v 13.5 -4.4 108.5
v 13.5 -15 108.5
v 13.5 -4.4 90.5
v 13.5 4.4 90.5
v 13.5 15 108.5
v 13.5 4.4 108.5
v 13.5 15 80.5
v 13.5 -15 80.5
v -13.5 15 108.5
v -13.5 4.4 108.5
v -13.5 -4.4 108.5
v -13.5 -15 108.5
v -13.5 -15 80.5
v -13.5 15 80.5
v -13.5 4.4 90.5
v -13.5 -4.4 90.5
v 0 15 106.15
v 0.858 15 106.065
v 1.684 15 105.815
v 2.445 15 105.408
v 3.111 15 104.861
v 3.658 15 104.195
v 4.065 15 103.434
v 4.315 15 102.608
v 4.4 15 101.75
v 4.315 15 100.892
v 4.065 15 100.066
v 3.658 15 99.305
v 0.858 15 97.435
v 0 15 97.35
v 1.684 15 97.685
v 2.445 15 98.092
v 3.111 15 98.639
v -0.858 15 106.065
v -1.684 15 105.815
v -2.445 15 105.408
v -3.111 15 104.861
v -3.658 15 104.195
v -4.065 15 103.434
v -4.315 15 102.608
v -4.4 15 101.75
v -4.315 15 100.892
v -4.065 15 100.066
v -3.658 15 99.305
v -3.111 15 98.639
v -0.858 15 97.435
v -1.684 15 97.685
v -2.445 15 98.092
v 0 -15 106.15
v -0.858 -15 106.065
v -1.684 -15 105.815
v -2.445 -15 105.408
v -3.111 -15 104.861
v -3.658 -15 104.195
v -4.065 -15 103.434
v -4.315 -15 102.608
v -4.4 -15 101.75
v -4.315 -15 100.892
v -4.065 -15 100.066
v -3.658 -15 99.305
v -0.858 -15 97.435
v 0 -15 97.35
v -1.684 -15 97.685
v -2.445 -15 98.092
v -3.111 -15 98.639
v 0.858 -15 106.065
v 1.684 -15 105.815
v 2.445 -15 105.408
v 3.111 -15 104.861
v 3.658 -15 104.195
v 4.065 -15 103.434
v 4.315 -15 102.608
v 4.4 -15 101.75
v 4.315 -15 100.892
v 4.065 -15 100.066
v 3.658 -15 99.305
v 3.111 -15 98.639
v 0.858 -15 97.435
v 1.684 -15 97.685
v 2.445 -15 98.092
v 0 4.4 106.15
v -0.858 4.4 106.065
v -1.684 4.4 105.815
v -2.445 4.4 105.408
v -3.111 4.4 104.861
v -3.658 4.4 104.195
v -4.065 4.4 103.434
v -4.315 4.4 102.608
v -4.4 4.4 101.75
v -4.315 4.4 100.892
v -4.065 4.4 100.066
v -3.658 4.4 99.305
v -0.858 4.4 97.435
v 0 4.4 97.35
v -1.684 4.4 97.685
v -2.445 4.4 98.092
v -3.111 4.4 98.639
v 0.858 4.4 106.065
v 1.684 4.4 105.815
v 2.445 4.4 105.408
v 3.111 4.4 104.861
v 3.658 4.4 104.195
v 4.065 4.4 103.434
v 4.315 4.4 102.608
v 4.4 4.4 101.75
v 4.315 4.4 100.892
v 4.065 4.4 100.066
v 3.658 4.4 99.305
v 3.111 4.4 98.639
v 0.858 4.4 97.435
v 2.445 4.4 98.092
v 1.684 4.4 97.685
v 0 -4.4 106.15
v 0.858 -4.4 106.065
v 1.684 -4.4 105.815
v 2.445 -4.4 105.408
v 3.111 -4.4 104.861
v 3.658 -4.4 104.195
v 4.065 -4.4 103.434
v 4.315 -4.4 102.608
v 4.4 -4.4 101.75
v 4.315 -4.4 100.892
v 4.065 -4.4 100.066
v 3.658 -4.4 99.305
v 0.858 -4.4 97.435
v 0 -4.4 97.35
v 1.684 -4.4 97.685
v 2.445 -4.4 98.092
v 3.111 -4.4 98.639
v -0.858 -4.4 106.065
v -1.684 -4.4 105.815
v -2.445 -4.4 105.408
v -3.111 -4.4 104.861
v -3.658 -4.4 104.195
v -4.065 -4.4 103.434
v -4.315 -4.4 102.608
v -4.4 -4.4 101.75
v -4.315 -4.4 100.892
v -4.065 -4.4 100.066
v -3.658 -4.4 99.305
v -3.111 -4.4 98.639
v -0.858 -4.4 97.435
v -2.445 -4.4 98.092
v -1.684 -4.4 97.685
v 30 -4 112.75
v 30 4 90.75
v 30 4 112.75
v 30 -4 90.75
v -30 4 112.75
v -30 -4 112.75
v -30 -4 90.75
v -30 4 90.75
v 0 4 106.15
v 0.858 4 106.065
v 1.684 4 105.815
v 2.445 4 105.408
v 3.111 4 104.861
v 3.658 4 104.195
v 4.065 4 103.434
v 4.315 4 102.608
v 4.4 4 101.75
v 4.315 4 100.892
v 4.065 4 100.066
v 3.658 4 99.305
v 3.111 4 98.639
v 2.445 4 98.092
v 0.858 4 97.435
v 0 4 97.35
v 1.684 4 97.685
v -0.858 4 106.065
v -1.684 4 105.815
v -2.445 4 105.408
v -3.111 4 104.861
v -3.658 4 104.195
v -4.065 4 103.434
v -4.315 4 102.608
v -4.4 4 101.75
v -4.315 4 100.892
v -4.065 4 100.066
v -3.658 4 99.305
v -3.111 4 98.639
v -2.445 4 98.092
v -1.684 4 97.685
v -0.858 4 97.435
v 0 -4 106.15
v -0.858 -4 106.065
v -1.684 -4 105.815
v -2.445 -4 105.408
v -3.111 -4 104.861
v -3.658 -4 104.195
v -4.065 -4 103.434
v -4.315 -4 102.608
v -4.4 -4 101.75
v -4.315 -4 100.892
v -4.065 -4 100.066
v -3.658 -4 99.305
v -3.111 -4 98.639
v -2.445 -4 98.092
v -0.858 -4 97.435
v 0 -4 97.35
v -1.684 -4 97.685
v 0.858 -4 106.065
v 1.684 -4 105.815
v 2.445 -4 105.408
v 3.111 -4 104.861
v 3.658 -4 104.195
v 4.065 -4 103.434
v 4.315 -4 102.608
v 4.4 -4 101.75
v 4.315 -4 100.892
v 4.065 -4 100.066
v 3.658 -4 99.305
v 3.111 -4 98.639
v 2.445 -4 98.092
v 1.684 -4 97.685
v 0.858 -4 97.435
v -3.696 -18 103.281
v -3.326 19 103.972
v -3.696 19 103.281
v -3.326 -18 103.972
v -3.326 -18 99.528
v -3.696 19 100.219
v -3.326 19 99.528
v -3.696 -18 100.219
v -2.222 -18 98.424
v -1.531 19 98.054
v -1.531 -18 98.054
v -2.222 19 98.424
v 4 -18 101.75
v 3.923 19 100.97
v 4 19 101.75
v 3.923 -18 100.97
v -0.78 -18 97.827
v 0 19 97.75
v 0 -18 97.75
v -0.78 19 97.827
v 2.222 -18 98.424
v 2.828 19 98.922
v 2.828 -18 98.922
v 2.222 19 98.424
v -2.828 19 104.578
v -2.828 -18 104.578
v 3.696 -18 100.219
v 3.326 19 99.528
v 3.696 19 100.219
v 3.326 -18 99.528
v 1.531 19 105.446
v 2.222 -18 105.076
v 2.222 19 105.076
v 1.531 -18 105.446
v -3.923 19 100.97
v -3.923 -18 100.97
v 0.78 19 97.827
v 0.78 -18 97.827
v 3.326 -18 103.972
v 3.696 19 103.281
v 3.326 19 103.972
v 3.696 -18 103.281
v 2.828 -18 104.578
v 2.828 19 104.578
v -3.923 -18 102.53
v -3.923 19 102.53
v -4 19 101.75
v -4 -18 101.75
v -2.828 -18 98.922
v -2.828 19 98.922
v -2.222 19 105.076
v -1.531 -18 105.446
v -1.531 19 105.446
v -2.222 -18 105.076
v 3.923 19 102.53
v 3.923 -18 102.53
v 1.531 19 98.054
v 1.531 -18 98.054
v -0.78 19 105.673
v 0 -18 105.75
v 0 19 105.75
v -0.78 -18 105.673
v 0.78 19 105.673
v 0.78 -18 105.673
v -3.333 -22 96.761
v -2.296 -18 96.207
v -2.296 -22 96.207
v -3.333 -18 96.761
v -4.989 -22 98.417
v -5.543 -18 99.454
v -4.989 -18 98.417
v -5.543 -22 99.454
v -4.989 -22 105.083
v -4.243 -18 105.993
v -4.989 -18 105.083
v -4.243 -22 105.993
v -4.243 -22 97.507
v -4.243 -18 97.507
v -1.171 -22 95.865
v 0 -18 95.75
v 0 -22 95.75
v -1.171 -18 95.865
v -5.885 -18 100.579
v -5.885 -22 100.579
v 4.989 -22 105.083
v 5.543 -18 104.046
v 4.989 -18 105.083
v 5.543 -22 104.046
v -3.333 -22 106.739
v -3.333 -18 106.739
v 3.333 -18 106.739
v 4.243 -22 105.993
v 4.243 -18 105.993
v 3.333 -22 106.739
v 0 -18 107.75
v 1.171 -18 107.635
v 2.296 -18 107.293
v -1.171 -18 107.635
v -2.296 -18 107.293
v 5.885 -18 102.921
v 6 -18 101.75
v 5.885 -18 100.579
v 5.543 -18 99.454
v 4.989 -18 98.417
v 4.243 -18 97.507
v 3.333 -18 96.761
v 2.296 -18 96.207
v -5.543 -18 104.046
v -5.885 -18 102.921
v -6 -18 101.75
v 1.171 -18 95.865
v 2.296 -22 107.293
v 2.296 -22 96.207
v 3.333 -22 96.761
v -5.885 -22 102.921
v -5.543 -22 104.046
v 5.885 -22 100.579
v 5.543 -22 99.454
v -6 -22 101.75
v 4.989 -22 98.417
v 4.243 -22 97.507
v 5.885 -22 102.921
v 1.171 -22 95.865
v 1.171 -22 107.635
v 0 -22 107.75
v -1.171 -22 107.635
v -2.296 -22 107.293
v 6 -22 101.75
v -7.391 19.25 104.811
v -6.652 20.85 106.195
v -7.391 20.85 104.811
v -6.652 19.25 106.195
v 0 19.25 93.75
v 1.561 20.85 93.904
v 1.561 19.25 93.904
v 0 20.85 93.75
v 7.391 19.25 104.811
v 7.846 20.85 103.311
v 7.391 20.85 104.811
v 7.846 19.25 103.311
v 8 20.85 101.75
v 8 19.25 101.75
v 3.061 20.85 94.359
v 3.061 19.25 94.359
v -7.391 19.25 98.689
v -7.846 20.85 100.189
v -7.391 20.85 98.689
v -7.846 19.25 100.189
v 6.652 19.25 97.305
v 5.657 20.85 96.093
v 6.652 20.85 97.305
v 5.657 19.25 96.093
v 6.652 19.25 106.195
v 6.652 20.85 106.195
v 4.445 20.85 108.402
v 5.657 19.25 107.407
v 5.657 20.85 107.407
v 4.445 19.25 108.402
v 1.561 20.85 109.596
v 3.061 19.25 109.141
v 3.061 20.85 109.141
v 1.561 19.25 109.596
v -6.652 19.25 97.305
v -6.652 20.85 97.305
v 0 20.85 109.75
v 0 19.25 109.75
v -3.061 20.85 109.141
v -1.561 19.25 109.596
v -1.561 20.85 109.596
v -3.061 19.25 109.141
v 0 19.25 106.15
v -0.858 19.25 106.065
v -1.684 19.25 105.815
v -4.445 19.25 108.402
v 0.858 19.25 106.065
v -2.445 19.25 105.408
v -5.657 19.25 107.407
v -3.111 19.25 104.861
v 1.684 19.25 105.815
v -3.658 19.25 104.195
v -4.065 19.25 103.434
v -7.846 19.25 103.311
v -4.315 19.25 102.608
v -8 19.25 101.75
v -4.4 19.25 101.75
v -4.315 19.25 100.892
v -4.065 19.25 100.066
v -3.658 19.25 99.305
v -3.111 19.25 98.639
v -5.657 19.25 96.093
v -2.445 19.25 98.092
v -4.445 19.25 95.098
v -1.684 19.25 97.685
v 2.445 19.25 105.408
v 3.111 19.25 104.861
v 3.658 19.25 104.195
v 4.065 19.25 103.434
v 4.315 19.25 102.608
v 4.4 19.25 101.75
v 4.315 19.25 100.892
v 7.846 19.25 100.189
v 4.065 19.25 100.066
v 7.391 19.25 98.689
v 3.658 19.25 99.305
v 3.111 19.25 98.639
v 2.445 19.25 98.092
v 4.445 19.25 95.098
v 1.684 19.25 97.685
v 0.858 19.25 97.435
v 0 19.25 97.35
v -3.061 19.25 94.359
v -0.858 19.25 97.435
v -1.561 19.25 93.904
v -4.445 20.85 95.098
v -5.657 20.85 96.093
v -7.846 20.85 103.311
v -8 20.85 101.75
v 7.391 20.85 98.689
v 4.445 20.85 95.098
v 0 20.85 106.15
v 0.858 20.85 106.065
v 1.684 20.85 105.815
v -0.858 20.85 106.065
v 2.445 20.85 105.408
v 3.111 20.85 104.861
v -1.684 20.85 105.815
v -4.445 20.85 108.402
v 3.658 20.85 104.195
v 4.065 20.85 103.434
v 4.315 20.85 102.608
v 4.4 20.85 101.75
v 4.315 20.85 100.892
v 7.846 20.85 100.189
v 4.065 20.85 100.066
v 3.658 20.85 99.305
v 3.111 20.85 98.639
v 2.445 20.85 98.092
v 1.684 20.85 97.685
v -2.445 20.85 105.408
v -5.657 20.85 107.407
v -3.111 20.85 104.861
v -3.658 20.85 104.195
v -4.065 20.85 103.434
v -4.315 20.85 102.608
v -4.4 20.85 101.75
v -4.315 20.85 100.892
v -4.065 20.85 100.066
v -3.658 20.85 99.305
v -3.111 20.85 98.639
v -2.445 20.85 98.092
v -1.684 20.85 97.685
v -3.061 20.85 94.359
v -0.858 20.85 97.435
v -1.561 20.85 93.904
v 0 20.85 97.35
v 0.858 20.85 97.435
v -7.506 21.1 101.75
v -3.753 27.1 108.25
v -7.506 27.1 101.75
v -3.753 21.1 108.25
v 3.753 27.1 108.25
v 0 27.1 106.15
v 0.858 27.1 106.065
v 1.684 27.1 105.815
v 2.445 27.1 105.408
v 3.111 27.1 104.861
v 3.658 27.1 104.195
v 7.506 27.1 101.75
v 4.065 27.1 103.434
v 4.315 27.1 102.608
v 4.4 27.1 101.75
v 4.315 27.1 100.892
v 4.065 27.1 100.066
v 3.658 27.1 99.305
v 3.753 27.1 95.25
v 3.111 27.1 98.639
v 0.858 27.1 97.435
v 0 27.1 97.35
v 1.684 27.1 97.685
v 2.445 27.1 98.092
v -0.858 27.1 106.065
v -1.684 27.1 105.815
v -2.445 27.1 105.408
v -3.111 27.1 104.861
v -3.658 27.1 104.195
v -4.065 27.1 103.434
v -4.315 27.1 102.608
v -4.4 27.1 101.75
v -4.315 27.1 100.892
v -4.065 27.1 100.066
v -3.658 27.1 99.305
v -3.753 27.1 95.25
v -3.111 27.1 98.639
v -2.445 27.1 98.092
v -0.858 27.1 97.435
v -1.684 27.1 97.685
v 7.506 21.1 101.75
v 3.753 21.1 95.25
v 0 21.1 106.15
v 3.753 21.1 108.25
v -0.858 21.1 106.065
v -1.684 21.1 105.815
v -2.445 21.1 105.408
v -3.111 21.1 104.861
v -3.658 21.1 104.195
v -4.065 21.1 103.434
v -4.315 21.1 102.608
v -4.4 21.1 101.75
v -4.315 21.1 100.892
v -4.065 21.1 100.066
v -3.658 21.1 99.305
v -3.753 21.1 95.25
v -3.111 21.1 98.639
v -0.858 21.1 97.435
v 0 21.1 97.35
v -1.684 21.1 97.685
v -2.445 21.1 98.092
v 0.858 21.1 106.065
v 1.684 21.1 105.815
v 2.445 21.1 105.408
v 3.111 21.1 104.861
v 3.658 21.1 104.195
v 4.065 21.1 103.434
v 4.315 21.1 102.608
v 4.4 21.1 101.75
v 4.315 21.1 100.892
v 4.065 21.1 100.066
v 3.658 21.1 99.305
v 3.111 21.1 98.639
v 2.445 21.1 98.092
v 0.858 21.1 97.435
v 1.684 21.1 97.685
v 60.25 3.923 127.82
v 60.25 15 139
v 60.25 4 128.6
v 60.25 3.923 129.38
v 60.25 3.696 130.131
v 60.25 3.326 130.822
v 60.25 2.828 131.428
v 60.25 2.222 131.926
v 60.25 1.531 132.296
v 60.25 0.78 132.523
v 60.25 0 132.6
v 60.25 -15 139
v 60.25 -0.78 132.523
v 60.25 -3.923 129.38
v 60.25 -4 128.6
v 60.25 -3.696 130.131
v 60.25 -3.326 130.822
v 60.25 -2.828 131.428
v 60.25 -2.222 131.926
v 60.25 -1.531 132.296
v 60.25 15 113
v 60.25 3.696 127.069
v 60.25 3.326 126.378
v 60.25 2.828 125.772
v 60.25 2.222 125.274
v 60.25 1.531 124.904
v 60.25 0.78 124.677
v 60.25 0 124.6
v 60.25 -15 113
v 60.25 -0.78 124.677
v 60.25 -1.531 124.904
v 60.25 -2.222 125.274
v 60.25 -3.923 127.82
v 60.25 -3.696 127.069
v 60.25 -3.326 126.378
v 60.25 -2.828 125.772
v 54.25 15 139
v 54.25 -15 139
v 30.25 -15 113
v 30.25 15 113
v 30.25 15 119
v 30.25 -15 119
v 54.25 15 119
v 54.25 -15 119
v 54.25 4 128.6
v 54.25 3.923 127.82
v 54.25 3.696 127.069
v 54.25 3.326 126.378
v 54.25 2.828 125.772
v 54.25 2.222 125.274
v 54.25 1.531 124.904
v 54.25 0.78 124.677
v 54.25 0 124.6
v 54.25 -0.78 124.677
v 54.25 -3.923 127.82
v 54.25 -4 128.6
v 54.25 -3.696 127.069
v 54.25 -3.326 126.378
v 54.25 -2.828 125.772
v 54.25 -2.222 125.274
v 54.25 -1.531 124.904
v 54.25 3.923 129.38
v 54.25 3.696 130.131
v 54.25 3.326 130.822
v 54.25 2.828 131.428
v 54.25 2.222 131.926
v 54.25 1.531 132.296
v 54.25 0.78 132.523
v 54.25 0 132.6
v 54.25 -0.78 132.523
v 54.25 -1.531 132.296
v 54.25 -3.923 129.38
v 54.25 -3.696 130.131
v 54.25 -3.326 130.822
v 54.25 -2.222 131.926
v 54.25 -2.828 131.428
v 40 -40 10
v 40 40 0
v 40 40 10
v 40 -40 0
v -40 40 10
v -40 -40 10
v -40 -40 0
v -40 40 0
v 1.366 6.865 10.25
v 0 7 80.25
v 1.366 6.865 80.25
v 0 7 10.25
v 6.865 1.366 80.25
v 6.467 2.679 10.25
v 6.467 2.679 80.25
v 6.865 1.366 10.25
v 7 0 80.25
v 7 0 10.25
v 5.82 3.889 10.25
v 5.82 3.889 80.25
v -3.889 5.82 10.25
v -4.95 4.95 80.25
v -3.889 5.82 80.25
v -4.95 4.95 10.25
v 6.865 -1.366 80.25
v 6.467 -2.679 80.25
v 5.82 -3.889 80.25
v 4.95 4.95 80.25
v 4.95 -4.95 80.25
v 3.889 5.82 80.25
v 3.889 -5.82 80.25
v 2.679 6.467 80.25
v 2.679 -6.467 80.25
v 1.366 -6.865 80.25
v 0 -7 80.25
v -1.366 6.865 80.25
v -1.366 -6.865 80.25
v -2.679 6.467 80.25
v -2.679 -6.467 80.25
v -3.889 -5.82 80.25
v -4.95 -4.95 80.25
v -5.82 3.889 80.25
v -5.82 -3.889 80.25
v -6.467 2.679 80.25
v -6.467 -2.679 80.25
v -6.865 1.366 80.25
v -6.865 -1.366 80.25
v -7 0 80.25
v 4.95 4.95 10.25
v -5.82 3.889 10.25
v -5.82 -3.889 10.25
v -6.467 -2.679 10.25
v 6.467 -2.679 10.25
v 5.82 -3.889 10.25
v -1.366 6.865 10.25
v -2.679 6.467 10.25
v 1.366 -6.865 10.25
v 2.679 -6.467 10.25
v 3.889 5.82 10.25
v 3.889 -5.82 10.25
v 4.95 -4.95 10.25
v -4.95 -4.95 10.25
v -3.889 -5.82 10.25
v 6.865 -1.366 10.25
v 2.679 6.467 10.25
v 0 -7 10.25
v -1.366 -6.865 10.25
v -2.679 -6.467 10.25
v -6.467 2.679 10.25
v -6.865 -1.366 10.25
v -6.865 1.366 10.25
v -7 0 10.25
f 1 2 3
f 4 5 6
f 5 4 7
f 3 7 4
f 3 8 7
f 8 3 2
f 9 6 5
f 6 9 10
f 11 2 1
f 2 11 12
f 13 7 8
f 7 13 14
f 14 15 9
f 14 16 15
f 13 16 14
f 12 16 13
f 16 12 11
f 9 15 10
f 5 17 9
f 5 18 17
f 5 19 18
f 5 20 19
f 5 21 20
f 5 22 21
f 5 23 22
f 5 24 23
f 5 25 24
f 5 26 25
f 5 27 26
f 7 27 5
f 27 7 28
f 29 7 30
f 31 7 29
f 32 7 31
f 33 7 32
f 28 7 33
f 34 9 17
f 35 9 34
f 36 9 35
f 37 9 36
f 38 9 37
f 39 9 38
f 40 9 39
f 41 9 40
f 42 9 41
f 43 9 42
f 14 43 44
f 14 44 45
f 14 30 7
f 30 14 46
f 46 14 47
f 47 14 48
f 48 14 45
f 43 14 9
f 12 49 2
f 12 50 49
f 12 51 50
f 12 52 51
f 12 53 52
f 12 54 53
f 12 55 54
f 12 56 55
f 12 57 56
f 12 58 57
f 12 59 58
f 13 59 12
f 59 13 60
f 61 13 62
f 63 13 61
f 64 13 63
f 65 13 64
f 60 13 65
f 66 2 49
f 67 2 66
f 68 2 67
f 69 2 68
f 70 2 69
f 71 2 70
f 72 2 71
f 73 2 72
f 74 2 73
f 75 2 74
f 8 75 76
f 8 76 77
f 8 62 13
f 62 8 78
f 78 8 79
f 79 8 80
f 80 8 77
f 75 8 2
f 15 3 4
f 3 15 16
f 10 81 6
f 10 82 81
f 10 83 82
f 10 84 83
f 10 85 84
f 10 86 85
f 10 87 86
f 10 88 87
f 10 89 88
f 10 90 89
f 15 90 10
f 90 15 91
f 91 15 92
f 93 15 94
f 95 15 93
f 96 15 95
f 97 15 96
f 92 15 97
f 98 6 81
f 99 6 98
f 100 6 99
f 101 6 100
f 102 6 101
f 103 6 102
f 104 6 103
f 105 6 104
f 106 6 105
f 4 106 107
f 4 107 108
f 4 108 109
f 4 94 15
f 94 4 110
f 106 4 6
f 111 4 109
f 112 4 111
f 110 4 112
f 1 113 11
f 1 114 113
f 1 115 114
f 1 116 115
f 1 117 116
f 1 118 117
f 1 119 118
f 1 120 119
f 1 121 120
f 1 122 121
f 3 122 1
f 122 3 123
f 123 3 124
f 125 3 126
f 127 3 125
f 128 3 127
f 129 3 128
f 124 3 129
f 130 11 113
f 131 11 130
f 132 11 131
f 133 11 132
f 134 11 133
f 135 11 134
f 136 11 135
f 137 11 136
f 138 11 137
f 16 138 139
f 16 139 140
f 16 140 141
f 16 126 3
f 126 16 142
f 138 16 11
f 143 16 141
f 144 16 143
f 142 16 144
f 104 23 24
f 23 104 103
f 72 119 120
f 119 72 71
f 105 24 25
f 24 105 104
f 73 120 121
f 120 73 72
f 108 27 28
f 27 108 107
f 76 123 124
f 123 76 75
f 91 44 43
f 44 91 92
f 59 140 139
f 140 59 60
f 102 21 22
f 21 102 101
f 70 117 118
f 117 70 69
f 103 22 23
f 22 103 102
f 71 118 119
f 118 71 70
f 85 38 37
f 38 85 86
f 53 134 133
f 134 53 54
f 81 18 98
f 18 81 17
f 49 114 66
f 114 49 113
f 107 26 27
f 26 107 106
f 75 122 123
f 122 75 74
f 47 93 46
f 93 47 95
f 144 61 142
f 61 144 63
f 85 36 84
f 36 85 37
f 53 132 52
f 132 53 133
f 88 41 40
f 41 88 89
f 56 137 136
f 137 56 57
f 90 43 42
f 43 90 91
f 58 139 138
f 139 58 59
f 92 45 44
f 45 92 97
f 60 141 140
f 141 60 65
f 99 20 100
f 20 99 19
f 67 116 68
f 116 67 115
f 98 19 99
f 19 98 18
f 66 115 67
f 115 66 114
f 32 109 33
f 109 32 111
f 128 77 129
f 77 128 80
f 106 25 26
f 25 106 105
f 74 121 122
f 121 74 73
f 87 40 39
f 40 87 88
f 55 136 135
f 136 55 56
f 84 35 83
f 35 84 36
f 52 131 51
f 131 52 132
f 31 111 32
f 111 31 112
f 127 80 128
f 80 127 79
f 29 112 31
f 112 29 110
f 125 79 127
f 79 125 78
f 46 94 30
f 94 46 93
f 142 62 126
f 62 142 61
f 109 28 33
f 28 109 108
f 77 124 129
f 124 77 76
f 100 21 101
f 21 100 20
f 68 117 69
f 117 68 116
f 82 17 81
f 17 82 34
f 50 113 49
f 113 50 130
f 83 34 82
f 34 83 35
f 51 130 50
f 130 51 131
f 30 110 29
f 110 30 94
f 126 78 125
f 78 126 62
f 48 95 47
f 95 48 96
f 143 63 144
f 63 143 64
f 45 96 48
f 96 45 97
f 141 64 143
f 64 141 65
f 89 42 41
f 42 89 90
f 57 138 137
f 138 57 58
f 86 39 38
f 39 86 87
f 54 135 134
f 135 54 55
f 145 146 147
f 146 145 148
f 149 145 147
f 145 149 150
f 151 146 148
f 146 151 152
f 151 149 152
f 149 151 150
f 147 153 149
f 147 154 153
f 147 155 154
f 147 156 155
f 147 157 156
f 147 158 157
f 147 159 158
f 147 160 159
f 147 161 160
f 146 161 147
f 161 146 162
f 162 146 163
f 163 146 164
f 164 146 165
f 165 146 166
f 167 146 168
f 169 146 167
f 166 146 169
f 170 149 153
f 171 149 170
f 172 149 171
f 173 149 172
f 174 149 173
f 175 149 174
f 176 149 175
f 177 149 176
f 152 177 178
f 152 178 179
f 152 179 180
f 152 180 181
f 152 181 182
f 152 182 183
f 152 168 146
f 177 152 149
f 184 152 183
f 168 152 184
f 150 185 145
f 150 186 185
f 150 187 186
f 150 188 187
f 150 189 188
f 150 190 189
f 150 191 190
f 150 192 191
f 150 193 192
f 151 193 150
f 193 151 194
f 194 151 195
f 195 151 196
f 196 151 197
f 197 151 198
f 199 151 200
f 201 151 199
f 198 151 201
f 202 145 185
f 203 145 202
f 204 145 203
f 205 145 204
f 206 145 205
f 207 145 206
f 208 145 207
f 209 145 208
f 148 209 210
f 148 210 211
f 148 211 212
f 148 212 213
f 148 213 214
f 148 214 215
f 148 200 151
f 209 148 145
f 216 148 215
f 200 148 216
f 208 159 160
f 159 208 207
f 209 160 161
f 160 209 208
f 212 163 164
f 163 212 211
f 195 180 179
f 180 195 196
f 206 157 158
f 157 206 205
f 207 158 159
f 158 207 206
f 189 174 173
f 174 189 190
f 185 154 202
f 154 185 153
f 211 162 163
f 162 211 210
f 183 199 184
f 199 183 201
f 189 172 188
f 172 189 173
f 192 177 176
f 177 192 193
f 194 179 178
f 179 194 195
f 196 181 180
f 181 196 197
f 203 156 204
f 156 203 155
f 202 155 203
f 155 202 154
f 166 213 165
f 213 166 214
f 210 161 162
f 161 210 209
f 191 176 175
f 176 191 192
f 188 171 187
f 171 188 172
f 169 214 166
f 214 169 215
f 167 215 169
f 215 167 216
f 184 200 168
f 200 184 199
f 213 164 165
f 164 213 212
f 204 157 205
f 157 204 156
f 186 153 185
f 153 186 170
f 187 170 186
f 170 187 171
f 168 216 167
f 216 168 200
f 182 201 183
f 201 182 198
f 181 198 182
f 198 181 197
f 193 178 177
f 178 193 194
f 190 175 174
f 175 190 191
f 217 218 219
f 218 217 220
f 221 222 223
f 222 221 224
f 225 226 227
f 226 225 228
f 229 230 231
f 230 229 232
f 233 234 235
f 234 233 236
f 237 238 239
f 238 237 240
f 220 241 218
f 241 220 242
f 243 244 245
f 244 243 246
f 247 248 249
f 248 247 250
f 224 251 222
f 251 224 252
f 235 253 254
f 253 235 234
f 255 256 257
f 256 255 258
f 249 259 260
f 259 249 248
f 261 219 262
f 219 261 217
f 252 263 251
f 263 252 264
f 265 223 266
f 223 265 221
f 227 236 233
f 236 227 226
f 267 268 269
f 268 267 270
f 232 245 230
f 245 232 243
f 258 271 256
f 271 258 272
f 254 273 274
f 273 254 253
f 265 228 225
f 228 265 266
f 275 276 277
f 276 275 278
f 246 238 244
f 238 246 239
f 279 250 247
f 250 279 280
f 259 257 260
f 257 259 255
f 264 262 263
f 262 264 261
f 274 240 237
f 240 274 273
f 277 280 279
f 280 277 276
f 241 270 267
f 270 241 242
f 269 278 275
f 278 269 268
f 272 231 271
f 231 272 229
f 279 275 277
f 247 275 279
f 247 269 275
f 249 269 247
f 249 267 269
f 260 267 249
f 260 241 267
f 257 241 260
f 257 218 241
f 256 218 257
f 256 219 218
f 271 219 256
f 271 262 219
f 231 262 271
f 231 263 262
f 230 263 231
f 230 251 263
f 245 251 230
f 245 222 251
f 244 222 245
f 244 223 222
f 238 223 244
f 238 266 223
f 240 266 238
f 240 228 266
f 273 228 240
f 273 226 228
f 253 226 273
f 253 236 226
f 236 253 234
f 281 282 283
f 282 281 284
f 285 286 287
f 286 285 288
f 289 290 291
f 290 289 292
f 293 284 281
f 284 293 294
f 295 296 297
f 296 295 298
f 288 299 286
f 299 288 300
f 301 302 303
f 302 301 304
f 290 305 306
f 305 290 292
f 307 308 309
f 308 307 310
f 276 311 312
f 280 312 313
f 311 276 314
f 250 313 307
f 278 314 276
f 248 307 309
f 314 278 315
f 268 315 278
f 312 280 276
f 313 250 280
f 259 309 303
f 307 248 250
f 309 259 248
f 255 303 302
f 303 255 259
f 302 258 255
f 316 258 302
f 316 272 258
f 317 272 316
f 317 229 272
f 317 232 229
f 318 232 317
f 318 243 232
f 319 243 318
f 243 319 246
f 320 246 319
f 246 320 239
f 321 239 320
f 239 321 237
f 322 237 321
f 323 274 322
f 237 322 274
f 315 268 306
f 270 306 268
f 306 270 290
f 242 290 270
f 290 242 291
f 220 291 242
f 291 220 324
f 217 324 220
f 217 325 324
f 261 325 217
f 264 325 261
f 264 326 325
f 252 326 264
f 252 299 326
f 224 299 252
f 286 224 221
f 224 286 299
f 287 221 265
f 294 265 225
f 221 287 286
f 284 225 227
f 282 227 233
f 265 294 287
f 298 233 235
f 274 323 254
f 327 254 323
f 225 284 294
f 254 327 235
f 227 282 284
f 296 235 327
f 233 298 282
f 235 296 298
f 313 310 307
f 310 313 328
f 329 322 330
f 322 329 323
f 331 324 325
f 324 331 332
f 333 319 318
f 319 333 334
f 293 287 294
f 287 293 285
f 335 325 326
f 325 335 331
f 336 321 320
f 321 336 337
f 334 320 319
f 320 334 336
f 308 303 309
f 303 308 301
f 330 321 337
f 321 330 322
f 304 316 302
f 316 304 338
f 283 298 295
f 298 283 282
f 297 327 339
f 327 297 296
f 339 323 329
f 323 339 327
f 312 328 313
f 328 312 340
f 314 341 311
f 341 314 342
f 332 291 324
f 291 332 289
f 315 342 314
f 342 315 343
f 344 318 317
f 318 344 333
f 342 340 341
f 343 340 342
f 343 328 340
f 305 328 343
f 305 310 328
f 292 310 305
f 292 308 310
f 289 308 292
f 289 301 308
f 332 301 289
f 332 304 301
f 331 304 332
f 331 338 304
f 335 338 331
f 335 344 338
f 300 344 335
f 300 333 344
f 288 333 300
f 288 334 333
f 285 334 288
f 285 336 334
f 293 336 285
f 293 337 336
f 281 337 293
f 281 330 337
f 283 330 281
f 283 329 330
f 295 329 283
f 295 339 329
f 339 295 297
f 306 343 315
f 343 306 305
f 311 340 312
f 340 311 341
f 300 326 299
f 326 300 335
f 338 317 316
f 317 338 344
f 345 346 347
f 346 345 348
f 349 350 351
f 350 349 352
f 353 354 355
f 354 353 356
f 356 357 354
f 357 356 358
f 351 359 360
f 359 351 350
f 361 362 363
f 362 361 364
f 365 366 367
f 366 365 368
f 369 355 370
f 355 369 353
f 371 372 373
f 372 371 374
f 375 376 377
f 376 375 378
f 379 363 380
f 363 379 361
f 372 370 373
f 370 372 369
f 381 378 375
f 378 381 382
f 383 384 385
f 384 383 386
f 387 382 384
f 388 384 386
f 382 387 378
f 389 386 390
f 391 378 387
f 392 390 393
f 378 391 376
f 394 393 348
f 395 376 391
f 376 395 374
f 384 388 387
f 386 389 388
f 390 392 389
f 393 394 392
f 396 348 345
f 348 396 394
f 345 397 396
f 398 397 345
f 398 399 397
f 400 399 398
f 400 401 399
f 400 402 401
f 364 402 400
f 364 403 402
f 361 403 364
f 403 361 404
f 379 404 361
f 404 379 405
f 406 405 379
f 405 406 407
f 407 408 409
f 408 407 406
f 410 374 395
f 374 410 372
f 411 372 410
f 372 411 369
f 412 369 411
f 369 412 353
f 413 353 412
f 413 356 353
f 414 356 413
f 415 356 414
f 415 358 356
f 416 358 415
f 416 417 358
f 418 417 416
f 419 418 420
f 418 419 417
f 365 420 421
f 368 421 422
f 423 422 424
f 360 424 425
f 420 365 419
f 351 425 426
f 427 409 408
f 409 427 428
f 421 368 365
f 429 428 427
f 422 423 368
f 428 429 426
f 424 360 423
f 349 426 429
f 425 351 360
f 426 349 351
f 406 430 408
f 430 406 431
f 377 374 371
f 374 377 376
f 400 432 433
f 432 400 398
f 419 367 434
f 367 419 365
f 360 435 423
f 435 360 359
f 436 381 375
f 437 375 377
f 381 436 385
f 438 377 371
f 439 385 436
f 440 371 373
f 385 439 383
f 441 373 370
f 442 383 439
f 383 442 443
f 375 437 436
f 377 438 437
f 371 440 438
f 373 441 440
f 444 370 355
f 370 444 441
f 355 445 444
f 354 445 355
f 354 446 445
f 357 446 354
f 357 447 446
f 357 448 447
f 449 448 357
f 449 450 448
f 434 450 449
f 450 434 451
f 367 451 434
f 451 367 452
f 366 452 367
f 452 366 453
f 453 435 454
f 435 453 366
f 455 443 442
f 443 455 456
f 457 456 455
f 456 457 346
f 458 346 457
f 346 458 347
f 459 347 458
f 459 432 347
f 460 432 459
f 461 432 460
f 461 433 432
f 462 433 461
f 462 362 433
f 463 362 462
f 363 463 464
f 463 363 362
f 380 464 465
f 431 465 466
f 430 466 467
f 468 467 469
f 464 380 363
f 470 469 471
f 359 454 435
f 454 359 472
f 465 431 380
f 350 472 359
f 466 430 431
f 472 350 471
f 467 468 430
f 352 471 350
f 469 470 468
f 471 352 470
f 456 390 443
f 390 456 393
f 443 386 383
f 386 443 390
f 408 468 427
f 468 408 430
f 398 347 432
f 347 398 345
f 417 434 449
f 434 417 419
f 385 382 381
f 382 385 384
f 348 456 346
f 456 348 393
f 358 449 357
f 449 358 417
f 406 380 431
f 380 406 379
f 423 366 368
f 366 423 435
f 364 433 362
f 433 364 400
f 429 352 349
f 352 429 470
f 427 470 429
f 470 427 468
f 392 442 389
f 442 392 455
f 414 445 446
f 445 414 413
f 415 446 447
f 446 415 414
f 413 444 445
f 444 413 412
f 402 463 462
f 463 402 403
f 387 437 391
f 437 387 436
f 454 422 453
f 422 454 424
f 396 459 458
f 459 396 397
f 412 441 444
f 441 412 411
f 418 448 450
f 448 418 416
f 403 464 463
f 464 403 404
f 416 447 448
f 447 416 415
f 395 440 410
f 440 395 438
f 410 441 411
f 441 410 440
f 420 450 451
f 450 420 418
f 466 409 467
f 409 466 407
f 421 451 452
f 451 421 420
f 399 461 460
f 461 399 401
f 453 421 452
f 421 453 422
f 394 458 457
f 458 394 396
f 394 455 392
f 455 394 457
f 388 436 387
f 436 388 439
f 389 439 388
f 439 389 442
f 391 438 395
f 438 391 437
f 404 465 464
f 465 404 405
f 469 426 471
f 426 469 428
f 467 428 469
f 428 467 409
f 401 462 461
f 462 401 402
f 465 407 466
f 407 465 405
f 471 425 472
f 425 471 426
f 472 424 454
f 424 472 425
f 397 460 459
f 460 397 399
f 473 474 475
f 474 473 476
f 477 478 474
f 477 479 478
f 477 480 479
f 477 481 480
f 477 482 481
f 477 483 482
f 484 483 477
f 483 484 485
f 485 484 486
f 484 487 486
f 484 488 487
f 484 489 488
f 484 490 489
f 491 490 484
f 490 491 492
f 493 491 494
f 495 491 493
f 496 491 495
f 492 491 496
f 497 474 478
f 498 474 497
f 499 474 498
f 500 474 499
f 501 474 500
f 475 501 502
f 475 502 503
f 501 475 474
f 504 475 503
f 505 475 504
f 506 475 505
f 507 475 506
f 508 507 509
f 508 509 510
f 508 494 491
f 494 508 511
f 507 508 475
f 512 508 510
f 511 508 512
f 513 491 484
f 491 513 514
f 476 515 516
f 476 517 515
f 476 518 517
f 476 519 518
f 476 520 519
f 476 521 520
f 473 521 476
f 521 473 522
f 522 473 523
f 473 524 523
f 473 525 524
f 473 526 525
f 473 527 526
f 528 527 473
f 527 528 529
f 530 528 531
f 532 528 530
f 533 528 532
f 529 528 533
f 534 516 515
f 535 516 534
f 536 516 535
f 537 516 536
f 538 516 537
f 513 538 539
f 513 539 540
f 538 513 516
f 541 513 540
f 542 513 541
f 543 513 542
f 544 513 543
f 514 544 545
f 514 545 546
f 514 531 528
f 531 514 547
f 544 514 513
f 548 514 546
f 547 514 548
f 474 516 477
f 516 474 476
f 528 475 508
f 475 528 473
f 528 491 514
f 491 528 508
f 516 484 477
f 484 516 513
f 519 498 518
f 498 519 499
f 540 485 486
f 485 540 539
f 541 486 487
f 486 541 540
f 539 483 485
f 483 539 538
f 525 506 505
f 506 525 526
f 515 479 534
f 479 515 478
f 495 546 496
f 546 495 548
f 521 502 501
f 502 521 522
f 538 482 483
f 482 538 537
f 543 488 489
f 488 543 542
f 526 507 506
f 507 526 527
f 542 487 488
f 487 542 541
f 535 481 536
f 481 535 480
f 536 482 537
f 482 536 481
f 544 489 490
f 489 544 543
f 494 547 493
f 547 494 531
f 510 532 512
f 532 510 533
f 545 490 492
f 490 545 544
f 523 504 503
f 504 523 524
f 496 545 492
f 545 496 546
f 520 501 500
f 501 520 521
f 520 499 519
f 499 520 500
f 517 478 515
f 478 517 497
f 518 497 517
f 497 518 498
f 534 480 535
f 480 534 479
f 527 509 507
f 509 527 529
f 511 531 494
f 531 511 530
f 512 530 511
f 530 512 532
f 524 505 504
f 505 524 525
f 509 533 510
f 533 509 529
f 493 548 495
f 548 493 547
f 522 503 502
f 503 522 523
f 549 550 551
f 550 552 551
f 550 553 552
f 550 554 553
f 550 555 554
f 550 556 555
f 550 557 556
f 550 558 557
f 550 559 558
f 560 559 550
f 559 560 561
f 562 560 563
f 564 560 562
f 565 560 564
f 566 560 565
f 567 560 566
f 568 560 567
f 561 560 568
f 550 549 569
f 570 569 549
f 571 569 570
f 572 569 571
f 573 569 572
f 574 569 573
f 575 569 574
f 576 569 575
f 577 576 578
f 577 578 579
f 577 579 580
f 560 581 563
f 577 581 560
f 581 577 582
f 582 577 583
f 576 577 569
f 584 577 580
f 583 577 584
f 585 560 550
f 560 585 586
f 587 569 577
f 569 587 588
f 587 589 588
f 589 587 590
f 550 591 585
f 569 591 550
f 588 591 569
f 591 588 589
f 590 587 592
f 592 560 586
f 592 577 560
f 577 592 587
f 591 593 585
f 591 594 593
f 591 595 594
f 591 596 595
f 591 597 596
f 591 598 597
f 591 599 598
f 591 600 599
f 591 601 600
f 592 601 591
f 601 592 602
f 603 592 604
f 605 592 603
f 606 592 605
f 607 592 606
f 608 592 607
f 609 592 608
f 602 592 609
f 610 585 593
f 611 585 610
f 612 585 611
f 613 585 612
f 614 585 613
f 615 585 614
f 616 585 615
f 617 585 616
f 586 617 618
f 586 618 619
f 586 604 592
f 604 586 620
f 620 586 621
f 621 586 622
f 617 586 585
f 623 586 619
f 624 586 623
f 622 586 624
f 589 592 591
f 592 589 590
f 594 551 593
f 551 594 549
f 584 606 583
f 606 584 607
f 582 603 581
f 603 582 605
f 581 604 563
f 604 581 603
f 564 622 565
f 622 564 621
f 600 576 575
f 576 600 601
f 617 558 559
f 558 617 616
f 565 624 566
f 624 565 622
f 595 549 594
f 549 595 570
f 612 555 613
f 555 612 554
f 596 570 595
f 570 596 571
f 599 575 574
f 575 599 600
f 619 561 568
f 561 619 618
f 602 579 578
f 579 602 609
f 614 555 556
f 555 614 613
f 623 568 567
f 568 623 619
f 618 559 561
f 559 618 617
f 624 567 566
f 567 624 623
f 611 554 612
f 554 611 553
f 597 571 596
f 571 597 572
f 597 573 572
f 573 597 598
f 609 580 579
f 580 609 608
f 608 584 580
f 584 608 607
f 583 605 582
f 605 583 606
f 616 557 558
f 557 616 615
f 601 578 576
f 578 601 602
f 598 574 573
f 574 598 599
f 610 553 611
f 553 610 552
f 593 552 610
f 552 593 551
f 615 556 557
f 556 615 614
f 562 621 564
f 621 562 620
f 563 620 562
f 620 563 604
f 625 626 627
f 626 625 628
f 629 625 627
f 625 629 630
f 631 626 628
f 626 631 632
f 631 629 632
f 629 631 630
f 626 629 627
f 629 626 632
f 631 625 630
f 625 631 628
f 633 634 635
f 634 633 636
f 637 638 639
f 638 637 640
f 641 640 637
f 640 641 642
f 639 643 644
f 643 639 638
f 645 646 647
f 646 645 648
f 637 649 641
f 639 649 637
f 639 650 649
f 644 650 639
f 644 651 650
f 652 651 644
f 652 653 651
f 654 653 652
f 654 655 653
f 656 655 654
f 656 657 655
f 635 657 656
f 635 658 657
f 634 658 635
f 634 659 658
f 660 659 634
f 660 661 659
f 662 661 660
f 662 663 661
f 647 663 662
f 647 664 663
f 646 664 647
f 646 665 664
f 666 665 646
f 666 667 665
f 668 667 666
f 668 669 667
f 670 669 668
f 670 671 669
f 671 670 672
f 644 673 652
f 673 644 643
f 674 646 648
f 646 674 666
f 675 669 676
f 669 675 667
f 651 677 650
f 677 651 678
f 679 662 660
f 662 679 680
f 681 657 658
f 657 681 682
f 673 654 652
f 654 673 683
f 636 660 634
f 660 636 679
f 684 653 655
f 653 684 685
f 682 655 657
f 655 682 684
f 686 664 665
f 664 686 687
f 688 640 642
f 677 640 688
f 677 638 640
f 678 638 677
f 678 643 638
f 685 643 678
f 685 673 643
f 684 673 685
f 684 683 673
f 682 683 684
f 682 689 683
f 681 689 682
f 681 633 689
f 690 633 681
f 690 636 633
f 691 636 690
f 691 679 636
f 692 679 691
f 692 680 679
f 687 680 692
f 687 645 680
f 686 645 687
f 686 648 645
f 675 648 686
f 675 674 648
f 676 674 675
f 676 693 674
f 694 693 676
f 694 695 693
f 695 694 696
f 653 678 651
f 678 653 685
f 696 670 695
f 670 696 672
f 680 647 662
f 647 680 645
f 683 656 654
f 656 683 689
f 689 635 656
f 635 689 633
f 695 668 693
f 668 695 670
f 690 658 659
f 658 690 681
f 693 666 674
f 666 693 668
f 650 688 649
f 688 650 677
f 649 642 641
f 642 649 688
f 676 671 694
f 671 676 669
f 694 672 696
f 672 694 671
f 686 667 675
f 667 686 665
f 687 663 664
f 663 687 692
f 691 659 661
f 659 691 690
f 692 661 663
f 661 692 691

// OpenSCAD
$fn = 32;

// ------------------------------------------------------------------------
// Lamp arm: column d14 x 70 mm, arm 60 mm
// Every part is its own module, assembly() places every instance.
// ------------------------------------------------------------------------

// --- part 1 ---
module lamp_base() {
  difference() {
    translate([-40, -40, 0]) cube([80, 80, 10]);
  }
}

// --- part 2 ---
module lamp_column() {
  cylinder(h = 70, d = 14);
}

// --- part 3 ---
module head_fork() {
  difference() {
    translate([-13.5, -15, 0]) cube([27, 30, 28]);
    translate([-14.5, -4.4, 10]) cube([29, 8.8, 19]);
    translate([0, 0, 21.25]) rotate([90, 0, 0]) cylinder(h = 32, d = 8.8, center = true);
  }
}

// --- part 4 ---
module lamp_arm() {
  difference() {
    translate([-30, -4, 0]) cube([60, 8, 22]);
    translate([0, 0, 11]) rotate([90, 0, 0]) cylinder(h = 10, d = 8.8, center = true);
  }
}

// --- part 5 ---
module arm_pin() {
  rotate([0, 90, 0]) cylinder(h = 38, d = 8, center = true);
  translate([-22, 0, 0]) rotate([0, 90, 0]) cylinder(h = 4, d = 12);
}

// --- part 6 ---
module arm_washer() {
  difference() {
      translate([0, 0, 0]) cylinder(h = 1.6, d = 16);
      translate([0, 0, -1]) cylinder(h = 3.6, d = 8.8);
    }
}

// --- part 7 ---
module arm_nut() {
  difference() {
    linear_extrude(height = 6) polygon(points = [[7.506, 0], [3.753, 6.5], [-3.753, 6.5], [-7.506, 0], [-3.753, -6.5], [3.753, -6.5]]);
    translate([0, 0, -1]) cylinder(h = 8, d = 8.8);
  }
}

// --- part 8 ---
module shade_bracket() {
  difference() {
    translate([-15, -15, 0]) cube([30, 30, 26]);
    translate([-16, -16, 6]) cube([25, 32, 21]);
    translate([12, 0, 15.6]) rotate([0, 90, 0]) cylinder(h = 8, d = 8, center = true);
  }
}

// --- assembly ---
module assembly() {
  color([0.80, 0.24, 0.20]) translate([0, 0, 0]) rotate([0, 0, 0]) lamp_base();
  color([0.20, 0.45, 0.75]) translate([0, 0, 10.25]) rotate([0, 0, 0]) lamp_column();
  color([0.25, 0.62, 0.32]) translate([0, 0, 80.5]) rotate([0, 0, 0]) head_fork();
  color([0.92, 0.70, 0.18]) translate([0, 0, 90.75]) rotate([0, 0, 0]) lamp_arm();
  color([0.58, 0.35, 0.70]) translate([0, 0, 101.75]) rotate([0, 0, 90]) arm_pin();
  color([0.16, 0.66, 0.66]) translate([0, 20.85, 101.75]) rotate([90, 0, 0]) arm_washer();
  color([0.85, 0.48, 0.18]) translate([0, 27.1, 101.75]) rotate([90, 0, 0]) arm_nut();
  color([0.55, 0.60, 0.65]) translate([45.25, 0, 113]) rotate([0, 0, 0]) shade_bracket();
}

assembly();
